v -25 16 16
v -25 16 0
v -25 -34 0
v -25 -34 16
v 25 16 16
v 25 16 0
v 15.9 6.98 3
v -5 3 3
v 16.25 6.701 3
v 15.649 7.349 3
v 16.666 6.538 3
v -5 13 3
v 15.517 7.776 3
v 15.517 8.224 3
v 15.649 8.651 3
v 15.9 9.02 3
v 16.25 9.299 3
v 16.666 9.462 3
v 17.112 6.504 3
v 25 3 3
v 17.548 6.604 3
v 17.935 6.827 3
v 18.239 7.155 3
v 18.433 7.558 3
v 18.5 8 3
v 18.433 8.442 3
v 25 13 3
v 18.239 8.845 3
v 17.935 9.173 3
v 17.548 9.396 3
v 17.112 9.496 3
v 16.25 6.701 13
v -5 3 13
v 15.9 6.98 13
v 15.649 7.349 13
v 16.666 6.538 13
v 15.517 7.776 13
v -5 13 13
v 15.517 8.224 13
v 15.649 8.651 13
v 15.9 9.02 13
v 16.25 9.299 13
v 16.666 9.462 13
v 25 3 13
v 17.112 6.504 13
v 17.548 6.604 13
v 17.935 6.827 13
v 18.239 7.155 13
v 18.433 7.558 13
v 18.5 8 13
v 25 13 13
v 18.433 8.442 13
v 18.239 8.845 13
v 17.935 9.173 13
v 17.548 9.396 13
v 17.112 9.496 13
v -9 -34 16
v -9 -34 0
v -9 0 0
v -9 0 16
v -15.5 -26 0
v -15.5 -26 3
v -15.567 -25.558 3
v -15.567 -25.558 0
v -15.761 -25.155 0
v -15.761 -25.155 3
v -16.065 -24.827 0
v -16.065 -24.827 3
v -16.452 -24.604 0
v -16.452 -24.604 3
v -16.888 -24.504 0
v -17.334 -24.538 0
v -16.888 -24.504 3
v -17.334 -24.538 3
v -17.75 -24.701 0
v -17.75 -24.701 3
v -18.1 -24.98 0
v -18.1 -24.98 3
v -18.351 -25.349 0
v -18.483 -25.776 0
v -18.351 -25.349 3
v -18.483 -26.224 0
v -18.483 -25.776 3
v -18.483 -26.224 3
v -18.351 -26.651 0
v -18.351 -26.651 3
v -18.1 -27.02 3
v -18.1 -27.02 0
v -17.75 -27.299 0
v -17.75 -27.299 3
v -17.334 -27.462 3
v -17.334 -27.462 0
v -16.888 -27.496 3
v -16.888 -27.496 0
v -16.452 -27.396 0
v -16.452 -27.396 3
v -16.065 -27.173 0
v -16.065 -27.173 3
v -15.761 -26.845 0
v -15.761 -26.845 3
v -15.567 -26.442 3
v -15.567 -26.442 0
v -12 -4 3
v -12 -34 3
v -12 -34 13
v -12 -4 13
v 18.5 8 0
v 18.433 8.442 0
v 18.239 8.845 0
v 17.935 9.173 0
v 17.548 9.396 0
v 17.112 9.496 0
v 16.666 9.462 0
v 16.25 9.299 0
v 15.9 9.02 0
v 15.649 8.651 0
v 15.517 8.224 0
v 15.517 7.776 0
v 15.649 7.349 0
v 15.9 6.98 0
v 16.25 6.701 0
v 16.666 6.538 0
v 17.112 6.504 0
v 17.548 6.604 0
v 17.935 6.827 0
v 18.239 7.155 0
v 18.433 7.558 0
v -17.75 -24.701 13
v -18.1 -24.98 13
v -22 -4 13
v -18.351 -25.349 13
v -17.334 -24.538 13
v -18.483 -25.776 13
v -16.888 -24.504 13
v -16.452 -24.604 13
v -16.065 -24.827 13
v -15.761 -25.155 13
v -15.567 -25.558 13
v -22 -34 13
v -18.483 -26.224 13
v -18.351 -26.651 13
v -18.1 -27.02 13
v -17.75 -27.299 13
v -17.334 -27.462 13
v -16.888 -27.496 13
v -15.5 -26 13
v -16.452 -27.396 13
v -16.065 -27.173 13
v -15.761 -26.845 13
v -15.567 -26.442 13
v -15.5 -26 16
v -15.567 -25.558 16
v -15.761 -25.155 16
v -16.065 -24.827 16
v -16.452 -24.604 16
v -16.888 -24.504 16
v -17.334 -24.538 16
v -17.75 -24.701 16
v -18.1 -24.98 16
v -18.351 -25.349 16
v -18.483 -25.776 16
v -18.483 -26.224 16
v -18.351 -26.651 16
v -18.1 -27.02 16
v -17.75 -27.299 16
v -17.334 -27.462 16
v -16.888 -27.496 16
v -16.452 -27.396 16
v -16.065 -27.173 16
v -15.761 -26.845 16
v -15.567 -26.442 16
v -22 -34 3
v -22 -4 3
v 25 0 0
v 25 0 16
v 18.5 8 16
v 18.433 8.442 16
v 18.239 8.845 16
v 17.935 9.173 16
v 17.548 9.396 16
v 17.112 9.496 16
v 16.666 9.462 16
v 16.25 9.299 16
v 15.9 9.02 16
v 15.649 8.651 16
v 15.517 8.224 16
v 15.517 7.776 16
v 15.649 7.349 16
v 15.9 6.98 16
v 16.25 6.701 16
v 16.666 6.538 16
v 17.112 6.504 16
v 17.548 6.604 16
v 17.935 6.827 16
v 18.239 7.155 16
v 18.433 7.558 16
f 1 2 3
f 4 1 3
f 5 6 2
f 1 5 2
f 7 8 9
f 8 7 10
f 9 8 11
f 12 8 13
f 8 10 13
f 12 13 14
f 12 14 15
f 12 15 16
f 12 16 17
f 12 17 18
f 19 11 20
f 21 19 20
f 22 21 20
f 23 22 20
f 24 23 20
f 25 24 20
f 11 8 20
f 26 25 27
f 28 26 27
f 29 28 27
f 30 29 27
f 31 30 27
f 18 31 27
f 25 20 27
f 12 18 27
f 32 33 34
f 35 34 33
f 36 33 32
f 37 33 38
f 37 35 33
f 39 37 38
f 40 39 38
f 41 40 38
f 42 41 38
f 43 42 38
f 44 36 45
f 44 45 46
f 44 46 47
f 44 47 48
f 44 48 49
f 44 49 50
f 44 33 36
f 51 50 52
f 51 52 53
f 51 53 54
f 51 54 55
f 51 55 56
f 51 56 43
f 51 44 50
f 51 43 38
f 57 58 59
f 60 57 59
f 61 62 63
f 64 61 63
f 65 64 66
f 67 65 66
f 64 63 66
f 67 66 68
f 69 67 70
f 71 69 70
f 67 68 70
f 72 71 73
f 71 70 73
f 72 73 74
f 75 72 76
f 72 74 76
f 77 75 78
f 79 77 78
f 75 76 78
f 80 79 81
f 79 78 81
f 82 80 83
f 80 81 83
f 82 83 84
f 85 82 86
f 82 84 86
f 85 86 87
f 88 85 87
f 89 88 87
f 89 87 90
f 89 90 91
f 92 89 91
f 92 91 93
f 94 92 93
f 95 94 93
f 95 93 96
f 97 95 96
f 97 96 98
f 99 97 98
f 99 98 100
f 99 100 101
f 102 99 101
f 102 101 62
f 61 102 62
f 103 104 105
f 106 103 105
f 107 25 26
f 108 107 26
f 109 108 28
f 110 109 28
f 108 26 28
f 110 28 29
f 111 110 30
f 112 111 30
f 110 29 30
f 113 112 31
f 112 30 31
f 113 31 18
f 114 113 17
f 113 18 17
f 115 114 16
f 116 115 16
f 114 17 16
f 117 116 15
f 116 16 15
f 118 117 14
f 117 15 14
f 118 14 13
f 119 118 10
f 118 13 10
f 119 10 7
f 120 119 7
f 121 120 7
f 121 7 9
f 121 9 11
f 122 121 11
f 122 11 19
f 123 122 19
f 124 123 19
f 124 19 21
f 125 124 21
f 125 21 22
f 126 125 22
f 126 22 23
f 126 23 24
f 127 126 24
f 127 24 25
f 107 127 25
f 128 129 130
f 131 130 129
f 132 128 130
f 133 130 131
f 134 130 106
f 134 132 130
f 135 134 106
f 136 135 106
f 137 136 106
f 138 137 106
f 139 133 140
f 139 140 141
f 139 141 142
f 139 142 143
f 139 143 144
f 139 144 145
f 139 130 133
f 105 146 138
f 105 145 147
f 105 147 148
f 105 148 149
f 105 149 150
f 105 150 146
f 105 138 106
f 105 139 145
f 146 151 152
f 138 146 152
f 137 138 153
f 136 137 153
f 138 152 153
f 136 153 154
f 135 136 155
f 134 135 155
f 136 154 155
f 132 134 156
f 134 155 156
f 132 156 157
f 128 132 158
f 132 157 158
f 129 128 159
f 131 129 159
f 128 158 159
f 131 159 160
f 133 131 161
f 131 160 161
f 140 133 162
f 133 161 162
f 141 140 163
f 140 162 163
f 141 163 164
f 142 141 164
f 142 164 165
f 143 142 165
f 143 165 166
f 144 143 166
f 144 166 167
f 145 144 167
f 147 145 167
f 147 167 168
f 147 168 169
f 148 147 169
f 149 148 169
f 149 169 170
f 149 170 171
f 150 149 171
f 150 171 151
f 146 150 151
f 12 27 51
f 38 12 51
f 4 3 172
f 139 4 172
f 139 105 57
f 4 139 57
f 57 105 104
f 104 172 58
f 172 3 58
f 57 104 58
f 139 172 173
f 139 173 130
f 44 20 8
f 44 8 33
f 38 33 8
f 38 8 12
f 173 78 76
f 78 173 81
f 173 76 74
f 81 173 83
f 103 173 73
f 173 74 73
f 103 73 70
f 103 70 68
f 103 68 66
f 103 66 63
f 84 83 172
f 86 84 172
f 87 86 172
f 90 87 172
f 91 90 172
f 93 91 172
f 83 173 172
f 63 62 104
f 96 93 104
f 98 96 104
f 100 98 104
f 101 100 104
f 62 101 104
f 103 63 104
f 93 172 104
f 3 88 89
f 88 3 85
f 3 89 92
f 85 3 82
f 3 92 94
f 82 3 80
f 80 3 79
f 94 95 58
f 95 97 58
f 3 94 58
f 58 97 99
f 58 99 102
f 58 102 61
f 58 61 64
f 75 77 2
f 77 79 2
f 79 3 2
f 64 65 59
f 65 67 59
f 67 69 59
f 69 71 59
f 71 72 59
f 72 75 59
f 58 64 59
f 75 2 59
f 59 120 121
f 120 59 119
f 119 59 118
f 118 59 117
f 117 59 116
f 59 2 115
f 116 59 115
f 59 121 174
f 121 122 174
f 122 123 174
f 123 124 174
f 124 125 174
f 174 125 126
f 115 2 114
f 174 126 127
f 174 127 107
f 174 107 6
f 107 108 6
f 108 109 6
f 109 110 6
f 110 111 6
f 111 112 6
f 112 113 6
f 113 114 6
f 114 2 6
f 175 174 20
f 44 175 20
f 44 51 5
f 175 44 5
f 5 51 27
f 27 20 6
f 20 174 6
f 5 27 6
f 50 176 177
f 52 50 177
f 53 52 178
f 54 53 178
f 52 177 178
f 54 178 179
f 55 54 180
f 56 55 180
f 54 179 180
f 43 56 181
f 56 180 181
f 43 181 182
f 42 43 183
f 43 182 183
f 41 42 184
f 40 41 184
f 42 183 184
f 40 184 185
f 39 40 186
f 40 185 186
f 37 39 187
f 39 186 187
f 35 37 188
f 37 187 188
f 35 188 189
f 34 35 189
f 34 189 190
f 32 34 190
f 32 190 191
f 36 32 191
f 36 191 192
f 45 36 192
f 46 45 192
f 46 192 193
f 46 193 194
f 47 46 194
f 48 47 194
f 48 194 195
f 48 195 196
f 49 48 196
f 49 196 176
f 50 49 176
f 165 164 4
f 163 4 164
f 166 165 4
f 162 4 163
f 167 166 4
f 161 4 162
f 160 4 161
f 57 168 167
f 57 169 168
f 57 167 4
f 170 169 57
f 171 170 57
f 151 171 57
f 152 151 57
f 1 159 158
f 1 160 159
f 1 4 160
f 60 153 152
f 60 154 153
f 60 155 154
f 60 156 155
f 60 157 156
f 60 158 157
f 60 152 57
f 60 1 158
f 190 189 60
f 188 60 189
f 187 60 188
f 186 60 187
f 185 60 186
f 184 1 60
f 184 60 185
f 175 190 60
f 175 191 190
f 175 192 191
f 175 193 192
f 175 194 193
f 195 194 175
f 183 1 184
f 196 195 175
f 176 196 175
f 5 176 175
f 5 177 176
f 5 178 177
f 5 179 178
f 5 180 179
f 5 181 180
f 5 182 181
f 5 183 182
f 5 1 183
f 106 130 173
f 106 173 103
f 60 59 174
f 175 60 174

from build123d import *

# Parameters (mm, degrees)
F0_W     = 16
F0_H     = 34
F1_DEPTH = 16
F2_W     = 10
F2_H     = 10
F3_DEPTH = 30
F4_W     = 10
F4_H     = 10
F5_DEPTH = 30
F6_R     = 1.5
F7_DEPTH = 16


with BuildPart() as f1:
    # F0 (on Top) → F1 (new body)
    with BuildSketch(Plane.XY):
        Polygon((25, 16), (-25, 16), (-25, 0), (-9, 0), (25, 0), align=None)
        with Locations((-17, -17)):
            Rectangle(F0_W, F0_H)
    extrude(amount=F1_DEPTH)

    # F2 (on face) → F3 (cut)
    with BuildSketch(Plane.YZ.offset(25)):
        with Locations((8, 8)):
            Rectangle(F2_W, F2_H)
    extrude(amount=-F3_DEPTH, mode=Mode.SUBTRACT)

    # F4 (on face) → F5 (cut)
    with BuildSketch(Plane.XZ.offset(34)):
        with Locations((-17, 8)):
            Rectangle(F4_W, F4_H)
    extrude(amount=-F5_DEPTH, mode=Mode.SUBTRACT)

    # F6 (on face) → F7 (cut)
    with BuildSketch(Plane.XY.offset(16)):
        with Locations((-17, -26)):
            Circle(F6_R)
        with Locations((17, 8)):
            Circle(F6_R)
    extrude(amount=-F7_DEPTH, mode=Mode.SUBTRACT)


solid = f1.part
